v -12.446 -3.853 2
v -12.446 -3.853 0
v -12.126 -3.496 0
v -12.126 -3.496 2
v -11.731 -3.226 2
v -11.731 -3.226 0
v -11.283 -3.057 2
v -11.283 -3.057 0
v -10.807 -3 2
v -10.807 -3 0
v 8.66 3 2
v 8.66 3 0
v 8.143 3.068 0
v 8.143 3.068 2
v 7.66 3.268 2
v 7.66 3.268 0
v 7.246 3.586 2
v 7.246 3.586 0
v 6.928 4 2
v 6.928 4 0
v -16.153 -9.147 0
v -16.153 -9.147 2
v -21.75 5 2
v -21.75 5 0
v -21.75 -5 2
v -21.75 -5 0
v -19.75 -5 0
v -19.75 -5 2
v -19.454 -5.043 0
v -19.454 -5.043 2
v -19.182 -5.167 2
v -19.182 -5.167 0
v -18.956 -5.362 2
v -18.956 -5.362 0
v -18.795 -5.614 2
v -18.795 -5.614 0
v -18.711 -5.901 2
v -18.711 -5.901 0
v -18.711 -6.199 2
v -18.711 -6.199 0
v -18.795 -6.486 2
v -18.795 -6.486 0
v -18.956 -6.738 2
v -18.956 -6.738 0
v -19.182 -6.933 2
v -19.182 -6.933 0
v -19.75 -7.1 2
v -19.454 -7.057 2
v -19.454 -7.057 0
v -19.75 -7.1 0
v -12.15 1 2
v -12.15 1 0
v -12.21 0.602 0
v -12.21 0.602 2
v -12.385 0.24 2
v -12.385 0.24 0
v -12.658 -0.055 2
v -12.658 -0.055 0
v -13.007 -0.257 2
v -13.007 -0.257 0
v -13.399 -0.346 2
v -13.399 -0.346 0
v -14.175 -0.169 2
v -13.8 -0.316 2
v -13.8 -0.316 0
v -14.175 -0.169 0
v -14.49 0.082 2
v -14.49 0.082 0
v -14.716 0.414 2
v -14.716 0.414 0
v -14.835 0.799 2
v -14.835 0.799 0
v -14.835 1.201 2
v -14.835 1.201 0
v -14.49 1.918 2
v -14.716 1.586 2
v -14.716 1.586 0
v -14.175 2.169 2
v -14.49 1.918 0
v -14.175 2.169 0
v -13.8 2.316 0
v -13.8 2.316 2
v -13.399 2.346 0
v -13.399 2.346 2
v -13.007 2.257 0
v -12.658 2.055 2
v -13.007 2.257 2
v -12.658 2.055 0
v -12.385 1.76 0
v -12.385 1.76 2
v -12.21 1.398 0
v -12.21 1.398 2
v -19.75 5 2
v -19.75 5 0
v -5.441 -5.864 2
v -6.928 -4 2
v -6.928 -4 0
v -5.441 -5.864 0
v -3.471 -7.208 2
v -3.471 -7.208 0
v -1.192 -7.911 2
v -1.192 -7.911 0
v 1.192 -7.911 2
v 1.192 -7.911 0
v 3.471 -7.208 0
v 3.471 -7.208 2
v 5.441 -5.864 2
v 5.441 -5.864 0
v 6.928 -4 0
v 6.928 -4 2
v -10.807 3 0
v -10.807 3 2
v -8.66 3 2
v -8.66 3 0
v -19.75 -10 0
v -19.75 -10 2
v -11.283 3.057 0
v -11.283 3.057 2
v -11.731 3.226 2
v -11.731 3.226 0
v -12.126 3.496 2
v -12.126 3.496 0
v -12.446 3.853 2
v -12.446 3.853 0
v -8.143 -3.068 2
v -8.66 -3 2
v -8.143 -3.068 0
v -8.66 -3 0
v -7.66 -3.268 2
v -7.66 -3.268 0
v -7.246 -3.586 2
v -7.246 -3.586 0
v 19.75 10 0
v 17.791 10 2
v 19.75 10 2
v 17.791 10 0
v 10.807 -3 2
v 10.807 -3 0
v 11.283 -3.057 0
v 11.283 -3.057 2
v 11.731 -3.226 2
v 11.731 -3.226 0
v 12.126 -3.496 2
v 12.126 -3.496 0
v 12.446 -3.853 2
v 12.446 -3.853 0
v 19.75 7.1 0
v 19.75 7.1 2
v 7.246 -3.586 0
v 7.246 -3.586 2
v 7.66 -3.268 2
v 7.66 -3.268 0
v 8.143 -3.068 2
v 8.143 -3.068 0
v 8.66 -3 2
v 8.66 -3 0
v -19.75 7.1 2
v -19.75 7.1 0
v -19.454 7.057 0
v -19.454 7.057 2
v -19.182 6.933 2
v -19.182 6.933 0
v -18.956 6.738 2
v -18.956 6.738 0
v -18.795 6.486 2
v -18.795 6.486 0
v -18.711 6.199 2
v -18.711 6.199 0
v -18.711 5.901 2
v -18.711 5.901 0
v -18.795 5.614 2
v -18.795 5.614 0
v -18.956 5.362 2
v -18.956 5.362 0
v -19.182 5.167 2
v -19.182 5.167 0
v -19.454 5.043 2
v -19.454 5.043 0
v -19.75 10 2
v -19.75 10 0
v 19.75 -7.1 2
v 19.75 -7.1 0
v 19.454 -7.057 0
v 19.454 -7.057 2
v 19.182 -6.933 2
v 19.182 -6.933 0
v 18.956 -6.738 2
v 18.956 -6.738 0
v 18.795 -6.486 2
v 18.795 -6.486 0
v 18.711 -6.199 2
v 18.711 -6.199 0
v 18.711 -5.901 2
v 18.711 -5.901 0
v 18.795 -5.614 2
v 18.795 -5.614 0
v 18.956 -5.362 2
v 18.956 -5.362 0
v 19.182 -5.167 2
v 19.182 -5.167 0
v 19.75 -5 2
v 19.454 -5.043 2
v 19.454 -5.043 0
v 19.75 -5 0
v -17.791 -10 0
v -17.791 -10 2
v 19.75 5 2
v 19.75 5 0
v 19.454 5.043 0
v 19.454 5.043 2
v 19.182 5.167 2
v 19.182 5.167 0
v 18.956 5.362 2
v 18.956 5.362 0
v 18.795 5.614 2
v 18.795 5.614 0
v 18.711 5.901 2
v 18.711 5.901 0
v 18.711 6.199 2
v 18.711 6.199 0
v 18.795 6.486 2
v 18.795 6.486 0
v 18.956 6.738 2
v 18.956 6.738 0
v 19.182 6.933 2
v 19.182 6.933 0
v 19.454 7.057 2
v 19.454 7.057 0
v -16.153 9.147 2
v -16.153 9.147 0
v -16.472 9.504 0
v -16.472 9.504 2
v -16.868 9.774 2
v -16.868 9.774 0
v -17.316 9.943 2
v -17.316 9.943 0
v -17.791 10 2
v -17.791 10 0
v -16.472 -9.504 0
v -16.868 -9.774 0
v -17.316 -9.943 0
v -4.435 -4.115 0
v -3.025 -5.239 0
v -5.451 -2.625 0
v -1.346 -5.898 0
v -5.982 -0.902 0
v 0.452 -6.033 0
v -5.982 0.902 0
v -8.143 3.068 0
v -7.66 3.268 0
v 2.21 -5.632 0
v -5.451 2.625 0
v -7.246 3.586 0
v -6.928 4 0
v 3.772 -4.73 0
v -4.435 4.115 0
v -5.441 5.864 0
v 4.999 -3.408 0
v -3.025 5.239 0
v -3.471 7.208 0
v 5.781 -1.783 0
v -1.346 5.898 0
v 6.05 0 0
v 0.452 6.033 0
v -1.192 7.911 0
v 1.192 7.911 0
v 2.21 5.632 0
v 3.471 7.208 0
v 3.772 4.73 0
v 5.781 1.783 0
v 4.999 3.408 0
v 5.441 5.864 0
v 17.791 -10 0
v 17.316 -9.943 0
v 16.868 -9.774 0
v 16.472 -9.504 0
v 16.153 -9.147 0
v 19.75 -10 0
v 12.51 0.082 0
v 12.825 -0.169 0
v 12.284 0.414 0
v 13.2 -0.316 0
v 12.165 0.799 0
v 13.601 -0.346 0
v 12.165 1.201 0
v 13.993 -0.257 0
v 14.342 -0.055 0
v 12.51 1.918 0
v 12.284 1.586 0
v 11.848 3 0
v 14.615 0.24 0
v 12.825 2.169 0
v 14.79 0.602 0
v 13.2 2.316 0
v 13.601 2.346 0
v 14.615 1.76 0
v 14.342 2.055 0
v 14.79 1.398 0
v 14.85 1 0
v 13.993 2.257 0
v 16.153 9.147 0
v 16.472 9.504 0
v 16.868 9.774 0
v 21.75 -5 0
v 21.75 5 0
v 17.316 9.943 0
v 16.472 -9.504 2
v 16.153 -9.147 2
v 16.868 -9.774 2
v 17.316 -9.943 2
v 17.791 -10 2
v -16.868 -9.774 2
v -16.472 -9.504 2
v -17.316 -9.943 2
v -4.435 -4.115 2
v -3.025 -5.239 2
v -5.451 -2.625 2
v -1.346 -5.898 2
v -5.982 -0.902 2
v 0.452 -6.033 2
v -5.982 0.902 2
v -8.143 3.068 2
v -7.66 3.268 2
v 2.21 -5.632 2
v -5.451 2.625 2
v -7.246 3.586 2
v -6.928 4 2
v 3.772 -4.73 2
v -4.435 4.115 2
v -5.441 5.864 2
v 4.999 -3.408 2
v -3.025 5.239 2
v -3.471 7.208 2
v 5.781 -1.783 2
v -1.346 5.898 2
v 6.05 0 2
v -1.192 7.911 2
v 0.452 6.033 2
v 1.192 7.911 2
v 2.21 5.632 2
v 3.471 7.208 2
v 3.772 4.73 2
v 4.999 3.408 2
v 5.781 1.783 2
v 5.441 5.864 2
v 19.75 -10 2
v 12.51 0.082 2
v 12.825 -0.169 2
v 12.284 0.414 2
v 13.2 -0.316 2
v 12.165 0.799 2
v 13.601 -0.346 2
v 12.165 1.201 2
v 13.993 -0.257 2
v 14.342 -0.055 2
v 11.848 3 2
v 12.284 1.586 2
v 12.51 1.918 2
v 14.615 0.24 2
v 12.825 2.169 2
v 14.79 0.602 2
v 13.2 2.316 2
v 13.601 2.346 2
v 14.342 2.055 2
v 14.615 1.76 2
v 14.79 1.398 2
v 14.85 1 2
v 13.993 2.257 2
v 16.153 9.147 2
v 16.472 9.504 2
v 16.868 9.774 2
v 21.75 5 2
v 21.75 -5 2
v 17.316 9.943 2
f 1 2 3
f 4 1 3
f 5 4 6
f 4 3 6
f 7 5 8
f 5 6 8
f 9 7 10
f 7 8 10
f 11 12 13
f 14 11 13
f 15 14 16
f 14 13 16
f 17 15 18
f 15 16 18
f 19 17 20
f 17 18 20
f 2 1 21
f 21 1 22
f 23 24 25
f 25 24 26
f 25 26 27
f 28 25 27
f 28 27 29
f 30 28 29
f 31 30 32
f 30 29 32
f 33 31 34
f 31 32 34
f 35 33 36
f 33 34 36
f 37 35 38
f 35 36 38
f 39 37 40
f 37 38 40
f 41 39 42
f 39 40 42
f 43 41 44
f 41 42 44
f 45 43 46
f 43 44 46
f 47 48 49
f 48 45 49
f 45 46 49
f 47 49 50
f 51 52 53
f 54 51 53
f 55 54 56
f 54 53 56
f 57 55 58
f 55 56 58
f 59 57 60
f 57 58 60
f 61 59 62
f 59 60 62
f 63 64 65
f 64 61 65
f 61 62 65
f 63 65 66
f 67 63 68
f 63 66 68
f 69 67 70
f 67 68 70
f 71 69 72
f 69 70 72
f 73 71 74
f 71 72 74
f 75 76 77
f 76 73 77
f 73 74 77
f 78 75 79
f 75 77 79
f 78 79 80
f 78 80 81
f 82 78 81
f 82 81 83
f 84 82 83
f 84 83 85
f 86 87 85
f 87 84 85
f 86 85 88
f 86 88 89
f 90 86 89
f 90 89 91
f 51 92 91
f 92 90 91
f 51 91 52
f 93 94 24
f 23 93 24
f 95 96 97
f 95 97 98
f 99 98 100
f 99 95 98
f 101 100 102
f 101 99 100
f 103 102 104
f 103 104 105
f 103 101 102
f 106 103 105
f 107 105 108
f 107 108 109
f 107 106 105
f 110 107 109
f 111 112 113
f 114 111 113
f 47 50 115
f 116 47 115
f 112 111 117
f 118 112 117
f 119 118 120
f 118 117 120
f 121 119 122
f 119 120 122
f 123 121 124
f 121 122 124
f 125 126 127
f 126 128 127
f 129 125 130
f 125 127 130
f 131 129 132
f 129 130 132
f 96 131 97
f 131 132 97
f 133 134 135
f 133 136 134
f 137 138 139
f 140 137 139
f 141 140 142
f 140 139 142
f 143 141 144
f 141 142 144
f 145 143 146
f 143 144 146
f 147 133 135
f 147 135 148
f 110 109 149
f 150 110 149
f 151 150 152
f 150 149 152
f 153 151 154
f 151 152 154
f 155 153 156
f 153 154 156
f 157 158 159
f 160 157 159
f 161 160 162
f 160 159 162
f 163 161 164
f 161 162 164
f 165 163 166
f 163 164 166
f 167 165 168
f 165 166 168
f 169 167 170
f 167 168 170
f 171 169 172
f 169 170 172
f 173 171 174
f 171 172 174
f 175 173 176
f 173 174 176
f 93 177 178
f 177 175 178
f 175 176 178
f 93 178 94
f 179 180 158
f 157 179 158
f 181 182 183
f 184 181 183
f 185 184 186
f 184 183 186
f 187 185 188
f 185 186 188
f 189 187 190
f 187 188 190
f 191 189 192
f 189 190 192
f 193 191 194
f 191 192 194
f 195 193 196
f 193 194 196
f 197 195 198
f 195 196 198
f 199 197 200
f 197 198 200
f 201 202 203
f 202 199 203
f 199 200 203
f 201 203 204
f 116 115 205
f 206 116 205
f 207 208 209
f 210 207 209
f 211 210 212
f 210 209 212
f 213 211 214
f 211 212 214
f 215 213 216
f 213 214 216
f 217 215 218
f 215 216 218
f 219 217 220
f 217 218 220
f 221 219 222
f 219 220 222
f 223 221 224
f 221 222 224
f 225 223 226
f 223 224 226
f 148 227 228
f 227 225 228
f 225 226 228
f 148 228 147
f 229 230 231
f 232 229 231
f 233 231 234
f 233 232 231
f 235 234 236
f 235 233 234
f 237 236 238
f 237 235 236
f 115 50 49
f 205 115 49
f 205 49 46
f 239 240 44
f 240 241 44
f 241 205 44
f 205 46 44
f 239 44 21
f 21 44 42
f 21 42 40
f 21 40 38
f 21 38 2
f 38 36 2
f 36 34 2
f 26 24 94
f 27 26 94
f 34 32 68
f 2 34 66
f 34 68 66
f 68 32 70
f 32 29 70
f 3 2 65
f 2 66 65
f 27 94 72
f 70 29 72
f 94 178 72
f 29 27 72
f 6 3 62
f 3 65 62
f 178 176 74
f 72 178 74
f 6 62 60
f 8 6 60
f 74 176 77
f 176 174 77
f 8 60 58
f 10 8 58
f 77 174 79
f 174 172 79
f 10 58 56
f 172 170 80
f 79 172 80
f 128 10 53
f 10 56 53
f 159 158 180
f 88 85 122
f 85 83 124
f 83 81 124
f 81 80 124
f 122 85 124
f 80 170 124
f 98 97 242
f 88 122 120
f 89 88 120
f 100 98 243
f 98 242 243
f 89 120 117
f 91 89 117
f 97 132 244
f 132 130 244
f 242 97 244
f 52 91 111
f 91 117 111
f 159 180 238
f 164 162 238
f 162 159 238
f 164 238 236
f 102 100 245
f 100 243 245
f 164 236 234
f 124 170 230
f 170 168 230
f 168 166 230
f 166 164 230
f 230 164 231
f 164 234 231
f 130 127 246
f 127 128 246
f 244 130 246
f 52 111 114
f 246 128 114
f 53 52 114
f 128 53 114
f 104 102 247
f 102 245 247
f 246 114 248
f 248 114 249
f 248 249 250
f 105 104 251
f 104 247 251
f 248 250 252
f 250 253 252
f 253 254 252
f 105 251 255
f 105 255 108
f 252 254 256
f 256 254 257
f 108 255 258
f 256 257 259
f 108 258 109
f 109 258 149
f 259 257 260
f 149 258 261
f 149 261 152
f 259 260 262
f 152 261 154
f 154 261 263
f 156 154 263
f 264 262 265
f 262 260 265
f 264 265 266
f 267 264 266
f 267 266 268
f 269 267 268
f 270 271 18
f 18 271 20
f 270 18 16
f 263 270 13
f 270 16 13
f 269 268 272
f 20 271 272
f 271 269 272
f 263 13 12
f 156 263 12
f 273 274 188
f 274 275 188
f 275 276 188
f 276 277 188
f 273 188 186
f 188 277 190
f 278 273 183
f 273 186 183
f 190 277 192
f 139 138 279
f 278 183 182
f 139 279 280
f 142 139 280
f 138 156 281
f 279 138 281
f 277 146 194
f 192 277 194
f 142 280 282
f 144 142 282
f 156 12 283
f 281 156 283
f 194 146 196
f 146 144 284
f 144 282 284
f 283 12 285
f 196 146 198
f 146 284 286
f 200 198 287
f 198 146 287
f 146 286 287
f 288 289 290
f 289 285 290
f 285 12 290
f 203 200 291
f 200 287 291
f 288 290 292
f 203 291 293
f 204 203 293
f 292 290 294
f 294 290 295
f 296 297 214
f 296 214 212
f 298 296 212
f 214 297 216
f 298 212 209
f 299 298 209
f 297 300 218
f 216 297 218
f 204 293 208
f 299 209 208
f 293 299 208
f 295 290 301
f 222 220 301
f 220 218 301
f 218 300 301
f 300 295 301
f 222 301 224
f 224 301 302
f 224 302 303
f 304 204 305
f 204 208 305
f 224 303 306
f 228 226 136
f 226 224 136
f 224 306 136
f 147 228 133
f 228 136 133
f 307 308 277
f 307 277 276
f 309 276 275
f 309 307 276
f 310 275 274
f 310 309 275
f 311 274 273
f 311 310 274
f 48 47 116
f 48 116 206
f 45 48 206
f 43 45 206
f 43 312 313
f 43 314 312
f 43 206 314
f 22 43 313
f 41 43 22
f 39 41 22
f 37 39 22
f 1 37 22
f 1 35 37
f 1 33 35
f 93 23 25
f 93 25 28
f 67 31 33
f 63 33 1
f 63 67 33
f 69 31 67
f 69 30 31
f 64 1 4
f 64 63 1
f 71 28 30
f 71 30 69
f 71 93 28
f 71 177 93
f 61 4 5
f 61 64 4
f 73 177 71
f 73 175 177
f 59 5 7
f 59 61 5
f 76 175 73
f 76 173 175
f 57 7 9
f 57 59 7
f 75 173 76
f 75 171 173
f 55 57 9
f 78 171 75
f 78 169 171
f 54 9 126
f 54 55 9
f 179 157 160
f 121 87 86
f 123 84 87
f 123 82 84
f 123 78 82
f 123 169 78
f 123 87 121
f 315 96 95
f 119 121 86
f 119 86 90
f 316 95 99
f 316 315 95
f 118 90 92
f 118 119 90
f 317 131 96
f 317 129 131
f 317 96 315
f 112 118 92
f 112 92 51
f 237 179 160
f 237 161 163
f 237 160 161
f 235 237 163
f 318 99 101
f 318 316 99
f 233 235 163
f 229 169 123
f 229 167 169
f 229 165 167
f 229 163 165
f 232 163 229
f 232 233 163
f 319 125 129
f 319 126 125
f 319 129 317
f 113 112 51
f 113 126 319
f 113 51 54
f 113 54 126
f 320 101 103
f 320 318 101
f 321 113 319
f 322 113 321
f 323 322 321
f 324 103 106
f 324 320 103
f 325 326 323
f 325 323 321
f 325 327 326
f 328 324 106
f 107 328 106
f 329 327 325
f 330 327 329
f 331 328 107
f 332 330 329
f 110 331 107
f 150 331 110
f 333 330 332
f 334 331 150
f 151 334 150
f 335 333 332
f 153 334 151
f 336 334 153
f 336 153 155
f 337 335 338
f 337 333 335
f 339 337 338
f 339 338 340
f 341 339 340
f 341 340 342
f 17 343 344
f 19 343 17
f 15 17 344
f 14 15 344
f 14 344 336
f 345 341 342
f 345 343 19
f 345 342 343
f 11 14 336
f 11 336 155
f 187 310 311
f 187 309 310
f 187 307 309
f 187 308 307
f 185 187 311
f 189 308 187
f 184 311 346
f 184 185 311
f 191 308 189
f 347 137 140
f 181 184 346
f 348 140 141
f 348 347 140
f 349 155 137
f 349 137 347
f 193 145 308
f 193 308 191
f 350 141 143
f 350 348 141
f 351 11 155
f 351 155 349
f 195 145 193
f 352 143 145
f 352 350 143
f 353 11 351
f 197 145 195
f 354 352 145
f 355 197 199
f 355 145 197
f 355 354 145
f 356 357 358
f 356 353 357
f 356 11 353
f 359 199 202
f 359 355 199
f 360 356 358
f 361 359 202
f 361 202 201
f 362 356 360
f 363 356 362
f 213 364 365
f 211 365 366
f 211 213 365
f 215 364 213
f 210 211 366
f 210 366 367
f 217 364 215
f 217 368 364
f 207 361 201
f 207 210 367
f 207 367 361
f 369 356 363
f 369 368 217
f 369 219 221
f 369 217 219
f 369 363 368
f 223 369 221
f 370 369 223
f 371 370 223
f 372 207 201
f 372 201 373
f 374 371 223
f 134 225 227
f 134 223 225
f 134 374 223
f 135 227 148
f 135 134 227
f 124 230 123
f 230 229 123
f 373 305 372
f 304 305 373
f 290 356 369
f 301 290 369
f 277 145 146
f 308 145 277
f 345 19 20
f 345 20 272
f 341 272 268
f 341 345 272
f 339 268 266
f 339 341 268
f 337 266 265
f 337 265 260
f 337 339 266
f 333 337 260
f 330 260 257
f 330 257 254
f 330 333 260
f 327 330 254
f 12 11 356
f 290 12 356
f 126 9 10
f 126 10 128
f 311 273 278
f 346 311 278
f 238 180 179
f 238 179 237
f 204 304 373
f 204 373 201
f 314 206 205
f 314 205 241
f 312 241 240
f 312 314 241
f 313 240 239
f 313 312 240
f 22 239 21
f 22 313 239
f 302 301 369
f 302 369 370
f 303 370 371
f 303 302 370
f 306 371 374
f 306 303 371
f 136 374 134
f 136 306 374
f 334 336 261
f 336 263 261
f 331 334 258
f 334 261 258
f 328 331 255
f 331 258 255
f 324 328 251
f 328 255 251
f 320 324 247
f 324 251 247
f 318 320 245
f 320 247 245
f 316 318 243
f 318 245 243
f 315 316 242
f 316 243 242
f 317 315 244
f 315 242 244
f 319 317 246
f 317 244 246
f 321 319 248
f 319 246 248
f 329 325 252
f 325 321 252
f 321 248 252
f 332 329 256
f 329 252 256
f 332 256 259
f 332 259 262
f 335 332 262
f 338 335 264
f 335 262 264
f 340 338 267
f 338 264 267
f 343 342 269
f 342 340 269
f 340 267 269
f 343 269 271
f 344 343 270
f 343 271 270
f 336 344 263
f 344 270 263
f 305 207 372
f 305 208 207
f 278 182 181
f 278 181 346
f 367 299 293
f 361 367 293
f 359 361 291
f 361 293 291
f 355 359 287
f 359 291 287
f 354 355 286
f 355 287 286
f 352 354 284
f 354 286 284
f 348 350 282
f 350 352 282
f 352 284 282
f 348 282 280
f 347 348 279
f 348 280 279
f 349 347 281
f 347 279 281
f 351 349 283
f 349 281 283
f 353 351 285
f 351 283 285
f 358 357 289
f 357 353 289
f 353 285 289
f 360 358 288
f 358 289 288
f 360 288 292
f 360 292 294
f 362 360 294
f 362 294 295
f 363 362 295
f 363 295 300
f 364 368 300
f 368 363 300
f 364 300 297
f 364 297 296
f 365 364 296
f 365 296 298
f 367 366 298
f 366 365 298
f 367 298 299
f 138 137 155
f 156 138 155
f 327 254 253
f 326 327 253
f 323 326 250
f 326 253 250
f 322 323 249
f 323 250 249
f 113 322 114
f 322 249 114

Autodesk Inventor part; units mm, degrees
ref_plane "YZ Plane" through (0, 0, 0) normal (1, 0, 0) x (0, 1, 0)
ref_plane "XZ Plane" through (0, 0, 0) normal (0, 1, 0) x (-1, 0, 0)
ref_plane "XY Plane" through (0, 0, 0) normal (0, 0, 1) x (1, 0, 0)
sketch "スケッチ1" plane through (0, 0, 0) normal (0, 0, 1) x (1, 0, 0)
  circle A0 centre (0, 0) radius 10.5 construction
  circle A1 centre (-13.5, 1) radius 1.35
  line L0 (-13.5, 28) -> (13.5, 28) construction
  line L1 (13.5, 28) -> (13.5, 1) construction
  line L2 (13.5, 1) -> (-13.5, 1) construction
  line L3 (-13.5, 1) -> (-13.5, 28) construction
  circle A2 centre (-13.5, 28) radius 1.35
  circle A3 centre (13.5, 1) radius 1.35
  circle A4 centre (13.5, 28) radius 1.35
  line L4 (-19.75, 10) -> (-19.75, 7.1)
  line L5 (-19.75, 10) -> (19.75, 10)
  line L6 (19.75, 10) -> (19.75, 7.1)
  line L7 (-19.75, -7.1) -> (-19.75, -10)
  line L8 (-19.75, -10) -> (19.75, -10)
  line L9 (19.75, -7.1) -> (19.75, -10)
  line L10 (-19.75, 5) -> (-21.75, 5)
  line L11 (-21.75, 5) -> (-21.75, -5)
  line L12 (-21.75, -5) -> (-19.75, -5)
  arc A5 (-19.75, 5) -> (-19.75, 7.1) centre (-19.75, 6.05) ccw
  arc A6 (-19.75, -7.1) -> (-19.75, -5) centre (-19.75, -6.05) ccw
  line L13 (19.75, 5) -> (21.75, 5)
  line L14 (21.75, 5) -> (21.75, -5)
  line L15 (21.75, -5) -> (19.75, -5)
  arc A7 (19.75, 7.1) -> (19.75, 5) centre (19.75, 6.05) ccw
  line L16 (0, 28) -> (0, 0) construction
  arc A8 (19.75, -5) -> (19.75, -7.1) centre (19.75, -6.05) ccw
  line L17 (-21.75, 0) -> (21.75, 0) construction
  circle A9 centre (0, 0) radius 6.05
  point P0 (0, 10)
  dimension "d8" = 21
  dimension "d10" = 27
  dimension "d12" = 1
  dimension "d13" = 2.7
  dimension "d38" = 27
  dimension "d44" = 27
  dimension "d47" = 1.05
  dimension "d48" = 39.5
  dimension "d49" = 2
  dimension "d50" = 10
  dimension "d51" = 5
  dimension "d52" = 12.1
extrude "押し出し1" add sketch "スケッチ1" along normal blind 2 contours L5 L6 A7 L13 L14 L15 A8 L9 L8 L7 A6 L12 L11 L10 A5 L4
sketch "スケッチ2" plane through (0, 0, 2) normal (0, 0, 1) x (1, 0, 0)
  circle A0 centre (0, 0) radius 6.05 projected
  circle A1 centre (-13.5, 1) radius 1.35 projected
  line L0 (-19.75, -10) -> (19.75, -10) projected
  line L1 (19.75, 10) -> (-19.75, 10) projected
  line L2 (-11.8485, 3) -> (-7.4162, 3)
  arc A2 (7.4162, 3) -> (-7.4162, 3) centre (0, 0) ccw
  line L3 (7.4162, 3) -> (11.8485, 3)
  line L4 (-18.4641, 12.448) -> (18.4641, 12.448)
  line L5 (-18.4641, 12.448) -> (-11.8485, 3)
  line L6 (11.8485, 3) -> (18.4641, 12.448)
  line L7 (-11.8485, -3) -> (-7.4162, -3)
  line L8 (-11.8485, -3) -> (-24.333, -20.8295)
  line L9 (-24.333, -20.8295) -> (24.333, -20.8295)
  line L10 (11.8485, -3) -> (7.4162, -3)
  line L11 (11.8485, -3) -> (24.333, -20.8295)
  arc A3 (-7.4162, -3) -> (7.4162, -3) centre (0, 0) ccw
  line L12 (-21.75, 5) -> (-21.75, -5) projected
  line L13 (-16.75, 10) -> (-19.75, 10) construction
  line L14 (0, 0) -> (-21.75, 0) construction
  line L15 (-19.75, -10) -> (-16.75, -10) construction
  line L16 (-19.75, -10) -> (19.75, -10) construction
  line L17 (0, 0) -> (0, 10) construction
  line L18 (19.75, 10) -> (16.75, 10) construction
  line L19 (19.75, -10) -> (16.75, -10) construction
  circle A4 centre (-13.5, 1) radius 2.5 construction
  dimension "d57" = 8
  dimension "d58" = 3
  dimension "d60" = 6
  dimension "d64" = 3
  dimension "d65" = 5
extrude "押し出し2" cut sketch "スケッチ2" against normal blind 10 contours L8 L7 A3 L10 L11 L0 | L0 L11 L9 L8 | L6 L3 A2 L2 L5 L1 | L1 L5 L4 L6
fillet "フィレット1" radius 2 11 edges at (-11.8485, 3, 1) (-7.4162, 3, 1) (7.4162, 3, 1) (11.8485, -3, 1) (7.4162, -3, 1) (-7.4162, -3, 1) (-11.8485, -3, 1) (-16.75, -10, 1) (-16.75, 10, 1) (16.75, 10, 1) (16.75, -10, 1)
equation "\"d38\" = d10"
equation "\"d44\" = d10"
equation "\"d50\" = d11"
equation "\"d51\" = d28"
equation "\"d60\" = 2 * d58"
equation "\"d11\" = 10"
equation "\"d28\" = 5"
properties part number "足首_サブフレーム_1_2" material "アルミニウム 2014-T4"
